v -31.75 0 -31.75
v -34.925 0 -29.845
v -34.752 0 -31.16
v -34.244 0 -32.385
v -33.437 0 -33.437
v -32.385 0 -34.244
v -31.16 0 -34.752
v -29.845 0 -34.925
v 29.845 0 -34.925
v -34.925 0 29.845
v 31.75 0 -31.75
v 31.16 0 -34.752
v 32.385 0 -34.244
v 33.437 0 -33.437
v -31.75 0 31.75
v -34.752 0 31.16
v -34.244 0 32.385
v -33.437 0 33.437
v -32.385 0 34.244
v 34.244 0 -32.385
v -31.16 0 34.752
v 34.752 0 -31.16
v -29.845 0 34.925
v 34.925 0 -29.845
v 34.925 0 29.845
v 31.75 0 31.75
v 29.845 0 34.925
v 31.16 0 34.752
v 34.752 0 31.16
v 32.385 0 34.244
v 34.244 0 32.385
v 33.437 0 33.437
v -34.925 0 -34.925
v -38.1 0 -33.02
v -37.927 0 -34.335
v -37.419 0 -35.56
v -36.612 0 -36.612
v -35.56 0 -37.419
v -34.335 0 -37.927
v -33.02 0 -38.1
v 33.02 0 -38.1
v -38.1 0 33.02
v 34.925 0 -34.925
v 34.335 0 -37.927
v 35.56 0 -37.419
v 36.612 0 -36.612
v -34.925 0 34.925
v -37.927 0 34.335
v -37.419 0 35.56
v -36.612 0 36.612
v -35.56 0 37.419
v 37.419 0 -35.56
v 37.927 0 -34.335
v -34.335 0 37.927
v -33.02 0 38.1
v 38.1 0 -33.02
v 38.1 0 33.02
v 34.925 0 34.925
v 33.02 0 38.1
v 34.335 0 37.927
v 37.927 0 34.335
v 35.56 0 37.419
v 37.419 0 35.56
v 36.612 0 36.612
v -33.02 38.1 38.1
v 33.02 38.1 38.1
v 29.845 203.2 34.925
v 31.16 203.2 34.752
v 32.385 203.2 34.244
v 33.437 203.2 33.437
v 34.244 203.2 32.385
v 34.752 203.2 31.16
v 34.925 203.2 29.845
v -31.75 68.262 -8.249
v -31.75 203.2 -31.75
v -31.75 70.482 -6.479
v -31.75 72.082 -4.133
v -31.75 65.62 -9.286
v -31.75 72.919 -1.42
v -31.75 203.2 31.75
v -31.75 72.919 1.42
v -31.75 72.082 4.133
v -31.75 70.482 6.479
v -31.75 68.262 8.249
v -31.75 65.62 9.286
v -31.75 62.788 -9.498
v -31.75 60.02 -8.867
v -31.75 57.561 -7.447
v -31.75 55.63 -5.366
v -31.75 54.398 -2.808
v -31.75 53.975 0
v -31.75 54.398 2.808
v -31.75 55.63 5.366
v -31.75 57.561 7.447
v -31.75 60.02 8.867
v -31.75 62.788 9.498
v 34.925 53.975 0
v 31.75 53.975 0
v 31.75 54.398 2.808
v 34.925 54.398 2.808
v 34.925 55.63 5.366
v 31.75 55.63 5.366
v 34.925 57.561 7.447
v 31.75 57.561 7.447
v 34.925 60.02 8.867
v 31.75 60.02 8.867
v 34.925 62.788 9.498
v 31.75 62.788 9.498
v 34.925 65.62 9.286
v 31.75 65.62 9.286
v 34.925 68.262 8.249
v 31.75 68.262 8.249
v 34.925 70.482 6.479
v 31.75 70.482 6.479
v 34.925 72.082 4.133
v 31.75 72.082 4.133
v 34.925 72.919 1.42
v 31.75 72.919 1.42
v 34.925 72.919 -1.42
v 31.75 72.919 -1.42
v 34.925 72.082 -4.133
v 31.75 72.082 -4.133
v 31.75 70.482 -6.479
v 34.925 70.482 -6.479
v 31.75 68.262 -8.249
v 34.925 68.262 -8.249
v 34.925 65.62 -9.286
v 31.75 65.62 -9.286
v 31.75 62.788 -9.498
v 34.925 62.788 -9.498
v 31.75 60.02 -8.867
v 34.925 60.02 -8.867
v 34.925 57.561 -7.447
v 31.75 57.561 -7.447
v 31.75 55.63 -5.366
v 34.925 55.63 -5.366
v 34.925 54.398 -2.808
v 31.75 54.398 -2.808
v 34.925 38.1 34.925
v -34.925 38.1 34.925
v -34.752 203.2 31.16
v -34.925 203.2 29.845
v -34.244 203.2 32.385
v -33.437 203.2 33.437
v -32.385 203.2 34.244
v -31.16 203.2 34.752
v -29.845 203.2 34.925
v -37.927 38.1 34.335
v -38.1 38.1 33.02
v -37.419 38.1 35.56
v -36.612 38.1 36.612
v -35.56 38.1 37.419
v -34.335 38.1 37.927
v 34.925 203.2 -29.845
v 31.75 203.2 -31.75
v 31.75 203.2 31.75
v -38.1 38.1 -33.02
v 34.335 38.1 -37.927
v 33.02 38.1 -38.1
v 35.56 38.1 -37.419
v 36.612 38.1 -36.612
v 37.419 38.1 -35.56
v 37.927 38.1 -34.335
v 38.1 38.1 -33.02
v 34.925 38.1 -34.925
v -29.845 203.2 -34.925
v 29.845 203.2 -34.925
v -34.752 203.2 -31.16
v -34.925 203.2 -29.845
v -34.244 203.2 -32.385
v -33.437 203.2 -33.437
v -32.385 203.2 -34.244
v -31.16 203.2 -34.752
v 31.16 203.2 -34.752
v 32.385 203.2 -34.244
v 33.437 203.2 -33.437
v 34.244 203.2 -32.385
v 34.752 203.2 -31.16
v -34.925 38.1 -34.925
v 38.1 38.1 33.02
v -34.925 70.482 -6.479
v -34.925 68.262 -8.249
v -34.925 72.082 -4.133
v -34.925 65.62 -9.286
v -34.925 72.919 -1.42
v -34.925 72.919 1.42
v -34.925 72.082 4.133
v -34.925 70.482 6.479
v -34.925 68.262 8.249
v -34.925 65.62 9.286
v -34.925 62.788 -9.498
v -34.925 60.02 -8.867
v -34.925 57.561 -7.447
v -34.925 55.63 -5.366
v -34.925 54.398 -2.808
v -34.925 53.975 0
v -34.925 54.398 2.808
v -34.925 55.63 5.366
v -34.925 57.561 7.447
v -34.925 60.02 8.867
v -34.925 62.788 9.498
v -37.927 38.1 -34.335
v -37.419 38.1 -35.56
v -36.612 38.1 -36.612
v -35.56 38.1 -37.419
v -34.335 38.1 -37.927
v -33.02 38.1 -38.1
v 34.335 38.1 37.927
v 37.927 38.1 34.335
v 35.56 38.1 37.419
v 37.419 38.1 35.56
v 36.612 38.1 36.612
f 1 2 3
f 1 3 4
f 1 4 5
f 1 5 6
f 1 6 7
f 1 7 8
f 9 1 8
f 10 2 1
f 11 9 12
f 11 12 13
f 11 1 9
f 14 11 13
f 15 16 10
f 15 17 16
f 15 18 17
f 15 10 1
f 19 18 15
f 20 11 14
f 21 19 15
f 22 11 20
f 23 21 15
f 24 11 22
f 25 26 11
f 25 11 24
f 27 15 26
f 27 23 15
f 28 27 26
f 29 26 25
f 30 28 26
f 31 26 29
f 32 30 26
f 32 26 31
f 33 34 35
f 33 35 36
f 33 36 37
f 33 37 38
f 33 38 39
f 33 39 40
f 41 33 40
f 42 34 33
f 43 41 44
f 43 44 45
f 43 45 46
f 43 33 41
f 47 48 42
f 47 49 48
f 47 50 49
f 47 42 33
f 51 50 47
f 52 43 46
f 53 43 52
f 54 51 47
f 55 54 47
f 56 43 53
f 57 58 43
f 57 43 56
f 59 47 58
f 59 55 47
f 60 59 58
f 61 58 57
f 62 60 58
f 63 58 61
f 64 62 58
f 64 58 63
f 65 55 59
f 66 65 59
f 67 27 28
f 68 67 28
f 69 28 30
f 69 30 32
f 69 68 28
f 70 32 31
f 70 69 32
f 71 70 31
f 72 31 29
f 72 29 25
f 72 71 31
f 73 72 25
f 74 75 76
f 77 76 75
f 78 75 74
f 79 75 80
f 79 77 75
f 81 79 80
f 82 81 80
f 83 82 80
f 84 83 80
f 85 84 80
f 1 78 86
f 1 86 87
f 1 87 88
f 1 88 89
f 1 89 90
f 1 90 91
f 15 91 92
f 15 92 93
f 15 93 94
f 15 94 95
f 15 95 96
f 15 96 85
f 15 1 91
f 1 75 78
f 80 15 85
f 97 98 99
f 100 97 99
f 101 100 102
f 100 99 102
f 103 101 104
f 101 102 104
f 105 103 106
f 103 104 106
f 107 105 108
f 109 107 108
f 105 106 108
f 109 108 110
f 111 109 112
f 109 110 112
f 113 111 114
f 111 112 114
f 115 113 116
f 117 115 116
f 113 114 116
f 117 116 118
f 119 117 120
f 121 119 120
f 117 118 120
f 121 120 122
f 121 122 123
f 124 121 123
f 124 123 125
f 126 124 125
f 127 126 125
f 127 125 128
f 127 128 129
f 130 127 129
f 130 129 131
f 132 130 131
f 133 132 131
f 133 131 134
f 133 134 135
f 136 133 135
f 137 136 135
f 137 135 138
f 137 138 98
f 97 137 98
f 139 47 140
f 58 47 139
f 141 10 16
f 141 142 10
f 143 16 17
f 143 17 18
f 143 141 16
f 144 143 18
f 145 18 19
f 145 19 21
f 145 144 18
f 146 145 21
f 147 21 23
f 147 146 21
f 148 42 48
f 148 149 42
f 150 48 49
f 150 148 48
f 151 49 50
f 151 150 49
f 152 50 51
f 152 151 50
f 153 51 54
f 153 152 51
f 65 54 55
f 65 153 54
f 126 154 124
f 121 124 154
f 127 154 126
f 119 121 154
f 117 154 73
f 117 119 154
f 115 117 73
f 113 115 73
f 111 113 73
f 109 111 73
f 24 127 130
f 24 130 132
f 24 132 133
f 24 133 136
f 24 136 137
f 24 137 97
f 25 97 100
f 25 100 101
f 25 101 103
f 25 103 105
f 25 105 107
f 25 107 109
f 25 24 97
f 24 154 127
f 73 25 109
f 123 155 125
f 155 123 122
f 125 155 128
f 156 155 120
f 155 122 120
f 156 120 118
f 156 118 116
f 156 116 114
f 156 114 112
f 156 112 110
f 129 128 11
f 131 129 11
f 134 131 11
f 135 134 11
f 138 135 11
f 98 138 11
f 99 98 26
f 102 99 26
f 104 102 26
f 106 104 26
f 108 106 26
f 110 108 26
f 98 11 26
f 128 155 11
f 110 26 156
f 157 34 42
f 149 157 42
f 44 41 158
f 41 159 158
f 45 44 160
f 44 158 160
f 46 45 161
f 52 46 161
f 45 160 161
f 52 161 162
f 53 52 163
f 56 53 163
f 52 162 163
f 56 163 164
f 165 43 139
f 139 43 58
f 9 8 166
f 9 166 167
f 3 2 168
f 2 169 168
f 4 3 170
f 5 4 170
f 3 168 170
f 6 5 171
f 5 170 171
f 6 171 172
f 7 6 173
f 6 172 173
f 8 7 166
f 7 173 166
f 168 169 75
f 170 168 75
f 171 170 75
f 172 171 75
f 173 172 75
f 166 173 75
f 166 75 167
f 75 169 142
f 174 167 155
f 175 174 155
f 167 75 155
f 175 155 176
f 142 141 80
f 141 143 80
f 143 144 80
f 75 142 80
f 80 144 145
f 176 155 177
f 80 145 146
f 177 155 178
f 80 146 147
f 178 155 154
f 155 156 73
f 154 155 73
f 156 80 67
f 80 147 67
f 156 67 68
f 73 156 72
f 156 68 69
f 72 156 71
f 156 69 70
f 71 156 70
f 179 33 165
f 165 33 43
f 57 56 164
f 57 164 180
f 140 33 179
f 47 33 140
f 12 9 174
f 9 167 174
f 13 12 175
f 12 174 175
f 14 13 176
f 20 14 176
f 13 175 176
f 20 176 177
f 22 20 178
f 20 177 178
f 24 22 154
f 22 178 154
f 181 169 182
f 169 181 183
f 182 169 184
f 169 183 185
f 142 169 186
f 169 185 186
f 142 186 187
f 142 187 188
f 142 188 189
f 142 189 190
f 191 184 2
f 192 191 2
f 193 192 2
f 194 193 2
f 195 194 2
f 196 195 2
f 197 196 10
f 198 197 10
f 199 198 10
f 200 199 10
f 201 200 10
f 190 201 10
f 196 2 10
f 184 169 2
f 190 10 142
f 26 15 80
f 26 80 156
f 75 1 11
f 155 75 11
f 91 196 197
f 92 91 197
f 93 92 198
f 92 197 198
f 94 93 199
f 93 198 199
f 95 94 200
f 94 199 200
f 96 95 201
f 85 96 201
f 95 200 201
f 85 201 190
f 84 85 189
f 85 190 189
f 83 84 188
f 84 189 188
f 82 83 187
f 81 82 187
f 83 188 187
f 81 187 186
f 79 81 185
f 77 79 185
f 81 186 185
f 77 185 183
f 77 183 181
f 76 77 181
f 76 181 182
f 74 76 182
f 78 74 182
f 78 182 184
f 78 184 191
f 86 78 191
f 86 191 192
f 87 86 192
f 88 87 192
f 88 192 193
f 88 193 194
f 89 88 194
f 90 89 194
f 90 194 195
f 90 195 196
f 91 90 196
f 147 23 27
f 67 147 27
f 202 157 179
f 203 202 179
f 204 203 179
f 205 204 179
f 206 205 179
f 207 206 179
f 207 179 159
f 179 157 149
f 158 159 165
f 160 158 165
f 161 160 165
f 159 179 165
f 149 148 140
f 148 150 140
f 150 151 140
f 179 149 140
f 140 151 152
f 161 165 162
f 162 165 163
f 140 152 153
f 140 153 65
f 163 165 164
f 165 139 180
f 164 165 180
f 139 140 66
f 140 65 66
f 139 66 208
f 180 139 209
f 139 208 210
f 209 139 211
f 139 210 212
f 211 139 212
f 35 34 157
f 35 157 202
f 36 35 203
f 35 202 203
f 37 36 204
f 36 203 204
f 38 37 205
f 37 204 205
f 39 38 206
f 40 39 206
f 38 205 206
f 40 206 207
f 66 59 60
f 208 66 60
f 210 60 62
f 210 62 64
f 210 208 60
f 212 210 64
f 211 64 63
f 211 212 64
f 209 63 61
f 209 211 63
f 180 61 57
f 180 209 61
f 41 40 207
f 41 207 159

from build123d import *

# Parameters (mm, degrees)
F0_W     = 69.85
F0_H     = 69.85
F0_W_2   = 63.5
F0_H_2   = 63.5
F1_DEPTH = 203.2
F0_W_3   = 76.2
F0_H_3   = 76.2
F2_DEPTH = 38.1
F3_R     = 5.08
F3_2_R   = 5.08
F5_D     = 19.05


with BuildPart() as f1:
    # F0 (on Front) → F1 (new body)
    with BuildSketch(Plane.XZ):
        Rectangle(F0_W, F0_H)
        Rectangle(F0_W_2, F0_H_2, mode=Mode.SUBTRACT)
    extrude(amount=-F1_DEPTH)

    # F3
    f3_edges = [f1.edges().sort_by_distance(p)[0] for p in [
        (34.925, 101.6, 34.925),
        (-34.925, 101.6, 34.925),
        (34.925, 101.6, -34.925),
        (-34.925, 101.6, -34.925),
    ]]
    fillet(f3_edges, radius=F3_R)

    # F5 (through all)
    with Locations(Plane.YZ.offset(34.925)):
        with Locations((63.5, 0)):
            Hole(F5_D / 2)


with BuildPart() as f2:
    # F0 (on Front) → F2 (new body)
    with BuildSketch(Plane.XZ):
        Rectangle(F0_W_3, F0_H_3)
        Rectangle(F0_W, F0_H, mode=Mode.SUBTRACT)
    extrude(amount=-F2_DEPTH)

    # F3#2
    f3_2_edges = [f2.edges().sort_by_distance(p)[0] for p in [
        (38.1, 19.05, 38.1),
        (-38.1, 19.05, 38.1),
        (38.1, 19.05, -38.1),
        (-38.1, 19.05, -38.1),
    ]]
    fillet(f3_2_edges, radius=F3_2_R)


solid = Compound([f1.part, f2.part])
